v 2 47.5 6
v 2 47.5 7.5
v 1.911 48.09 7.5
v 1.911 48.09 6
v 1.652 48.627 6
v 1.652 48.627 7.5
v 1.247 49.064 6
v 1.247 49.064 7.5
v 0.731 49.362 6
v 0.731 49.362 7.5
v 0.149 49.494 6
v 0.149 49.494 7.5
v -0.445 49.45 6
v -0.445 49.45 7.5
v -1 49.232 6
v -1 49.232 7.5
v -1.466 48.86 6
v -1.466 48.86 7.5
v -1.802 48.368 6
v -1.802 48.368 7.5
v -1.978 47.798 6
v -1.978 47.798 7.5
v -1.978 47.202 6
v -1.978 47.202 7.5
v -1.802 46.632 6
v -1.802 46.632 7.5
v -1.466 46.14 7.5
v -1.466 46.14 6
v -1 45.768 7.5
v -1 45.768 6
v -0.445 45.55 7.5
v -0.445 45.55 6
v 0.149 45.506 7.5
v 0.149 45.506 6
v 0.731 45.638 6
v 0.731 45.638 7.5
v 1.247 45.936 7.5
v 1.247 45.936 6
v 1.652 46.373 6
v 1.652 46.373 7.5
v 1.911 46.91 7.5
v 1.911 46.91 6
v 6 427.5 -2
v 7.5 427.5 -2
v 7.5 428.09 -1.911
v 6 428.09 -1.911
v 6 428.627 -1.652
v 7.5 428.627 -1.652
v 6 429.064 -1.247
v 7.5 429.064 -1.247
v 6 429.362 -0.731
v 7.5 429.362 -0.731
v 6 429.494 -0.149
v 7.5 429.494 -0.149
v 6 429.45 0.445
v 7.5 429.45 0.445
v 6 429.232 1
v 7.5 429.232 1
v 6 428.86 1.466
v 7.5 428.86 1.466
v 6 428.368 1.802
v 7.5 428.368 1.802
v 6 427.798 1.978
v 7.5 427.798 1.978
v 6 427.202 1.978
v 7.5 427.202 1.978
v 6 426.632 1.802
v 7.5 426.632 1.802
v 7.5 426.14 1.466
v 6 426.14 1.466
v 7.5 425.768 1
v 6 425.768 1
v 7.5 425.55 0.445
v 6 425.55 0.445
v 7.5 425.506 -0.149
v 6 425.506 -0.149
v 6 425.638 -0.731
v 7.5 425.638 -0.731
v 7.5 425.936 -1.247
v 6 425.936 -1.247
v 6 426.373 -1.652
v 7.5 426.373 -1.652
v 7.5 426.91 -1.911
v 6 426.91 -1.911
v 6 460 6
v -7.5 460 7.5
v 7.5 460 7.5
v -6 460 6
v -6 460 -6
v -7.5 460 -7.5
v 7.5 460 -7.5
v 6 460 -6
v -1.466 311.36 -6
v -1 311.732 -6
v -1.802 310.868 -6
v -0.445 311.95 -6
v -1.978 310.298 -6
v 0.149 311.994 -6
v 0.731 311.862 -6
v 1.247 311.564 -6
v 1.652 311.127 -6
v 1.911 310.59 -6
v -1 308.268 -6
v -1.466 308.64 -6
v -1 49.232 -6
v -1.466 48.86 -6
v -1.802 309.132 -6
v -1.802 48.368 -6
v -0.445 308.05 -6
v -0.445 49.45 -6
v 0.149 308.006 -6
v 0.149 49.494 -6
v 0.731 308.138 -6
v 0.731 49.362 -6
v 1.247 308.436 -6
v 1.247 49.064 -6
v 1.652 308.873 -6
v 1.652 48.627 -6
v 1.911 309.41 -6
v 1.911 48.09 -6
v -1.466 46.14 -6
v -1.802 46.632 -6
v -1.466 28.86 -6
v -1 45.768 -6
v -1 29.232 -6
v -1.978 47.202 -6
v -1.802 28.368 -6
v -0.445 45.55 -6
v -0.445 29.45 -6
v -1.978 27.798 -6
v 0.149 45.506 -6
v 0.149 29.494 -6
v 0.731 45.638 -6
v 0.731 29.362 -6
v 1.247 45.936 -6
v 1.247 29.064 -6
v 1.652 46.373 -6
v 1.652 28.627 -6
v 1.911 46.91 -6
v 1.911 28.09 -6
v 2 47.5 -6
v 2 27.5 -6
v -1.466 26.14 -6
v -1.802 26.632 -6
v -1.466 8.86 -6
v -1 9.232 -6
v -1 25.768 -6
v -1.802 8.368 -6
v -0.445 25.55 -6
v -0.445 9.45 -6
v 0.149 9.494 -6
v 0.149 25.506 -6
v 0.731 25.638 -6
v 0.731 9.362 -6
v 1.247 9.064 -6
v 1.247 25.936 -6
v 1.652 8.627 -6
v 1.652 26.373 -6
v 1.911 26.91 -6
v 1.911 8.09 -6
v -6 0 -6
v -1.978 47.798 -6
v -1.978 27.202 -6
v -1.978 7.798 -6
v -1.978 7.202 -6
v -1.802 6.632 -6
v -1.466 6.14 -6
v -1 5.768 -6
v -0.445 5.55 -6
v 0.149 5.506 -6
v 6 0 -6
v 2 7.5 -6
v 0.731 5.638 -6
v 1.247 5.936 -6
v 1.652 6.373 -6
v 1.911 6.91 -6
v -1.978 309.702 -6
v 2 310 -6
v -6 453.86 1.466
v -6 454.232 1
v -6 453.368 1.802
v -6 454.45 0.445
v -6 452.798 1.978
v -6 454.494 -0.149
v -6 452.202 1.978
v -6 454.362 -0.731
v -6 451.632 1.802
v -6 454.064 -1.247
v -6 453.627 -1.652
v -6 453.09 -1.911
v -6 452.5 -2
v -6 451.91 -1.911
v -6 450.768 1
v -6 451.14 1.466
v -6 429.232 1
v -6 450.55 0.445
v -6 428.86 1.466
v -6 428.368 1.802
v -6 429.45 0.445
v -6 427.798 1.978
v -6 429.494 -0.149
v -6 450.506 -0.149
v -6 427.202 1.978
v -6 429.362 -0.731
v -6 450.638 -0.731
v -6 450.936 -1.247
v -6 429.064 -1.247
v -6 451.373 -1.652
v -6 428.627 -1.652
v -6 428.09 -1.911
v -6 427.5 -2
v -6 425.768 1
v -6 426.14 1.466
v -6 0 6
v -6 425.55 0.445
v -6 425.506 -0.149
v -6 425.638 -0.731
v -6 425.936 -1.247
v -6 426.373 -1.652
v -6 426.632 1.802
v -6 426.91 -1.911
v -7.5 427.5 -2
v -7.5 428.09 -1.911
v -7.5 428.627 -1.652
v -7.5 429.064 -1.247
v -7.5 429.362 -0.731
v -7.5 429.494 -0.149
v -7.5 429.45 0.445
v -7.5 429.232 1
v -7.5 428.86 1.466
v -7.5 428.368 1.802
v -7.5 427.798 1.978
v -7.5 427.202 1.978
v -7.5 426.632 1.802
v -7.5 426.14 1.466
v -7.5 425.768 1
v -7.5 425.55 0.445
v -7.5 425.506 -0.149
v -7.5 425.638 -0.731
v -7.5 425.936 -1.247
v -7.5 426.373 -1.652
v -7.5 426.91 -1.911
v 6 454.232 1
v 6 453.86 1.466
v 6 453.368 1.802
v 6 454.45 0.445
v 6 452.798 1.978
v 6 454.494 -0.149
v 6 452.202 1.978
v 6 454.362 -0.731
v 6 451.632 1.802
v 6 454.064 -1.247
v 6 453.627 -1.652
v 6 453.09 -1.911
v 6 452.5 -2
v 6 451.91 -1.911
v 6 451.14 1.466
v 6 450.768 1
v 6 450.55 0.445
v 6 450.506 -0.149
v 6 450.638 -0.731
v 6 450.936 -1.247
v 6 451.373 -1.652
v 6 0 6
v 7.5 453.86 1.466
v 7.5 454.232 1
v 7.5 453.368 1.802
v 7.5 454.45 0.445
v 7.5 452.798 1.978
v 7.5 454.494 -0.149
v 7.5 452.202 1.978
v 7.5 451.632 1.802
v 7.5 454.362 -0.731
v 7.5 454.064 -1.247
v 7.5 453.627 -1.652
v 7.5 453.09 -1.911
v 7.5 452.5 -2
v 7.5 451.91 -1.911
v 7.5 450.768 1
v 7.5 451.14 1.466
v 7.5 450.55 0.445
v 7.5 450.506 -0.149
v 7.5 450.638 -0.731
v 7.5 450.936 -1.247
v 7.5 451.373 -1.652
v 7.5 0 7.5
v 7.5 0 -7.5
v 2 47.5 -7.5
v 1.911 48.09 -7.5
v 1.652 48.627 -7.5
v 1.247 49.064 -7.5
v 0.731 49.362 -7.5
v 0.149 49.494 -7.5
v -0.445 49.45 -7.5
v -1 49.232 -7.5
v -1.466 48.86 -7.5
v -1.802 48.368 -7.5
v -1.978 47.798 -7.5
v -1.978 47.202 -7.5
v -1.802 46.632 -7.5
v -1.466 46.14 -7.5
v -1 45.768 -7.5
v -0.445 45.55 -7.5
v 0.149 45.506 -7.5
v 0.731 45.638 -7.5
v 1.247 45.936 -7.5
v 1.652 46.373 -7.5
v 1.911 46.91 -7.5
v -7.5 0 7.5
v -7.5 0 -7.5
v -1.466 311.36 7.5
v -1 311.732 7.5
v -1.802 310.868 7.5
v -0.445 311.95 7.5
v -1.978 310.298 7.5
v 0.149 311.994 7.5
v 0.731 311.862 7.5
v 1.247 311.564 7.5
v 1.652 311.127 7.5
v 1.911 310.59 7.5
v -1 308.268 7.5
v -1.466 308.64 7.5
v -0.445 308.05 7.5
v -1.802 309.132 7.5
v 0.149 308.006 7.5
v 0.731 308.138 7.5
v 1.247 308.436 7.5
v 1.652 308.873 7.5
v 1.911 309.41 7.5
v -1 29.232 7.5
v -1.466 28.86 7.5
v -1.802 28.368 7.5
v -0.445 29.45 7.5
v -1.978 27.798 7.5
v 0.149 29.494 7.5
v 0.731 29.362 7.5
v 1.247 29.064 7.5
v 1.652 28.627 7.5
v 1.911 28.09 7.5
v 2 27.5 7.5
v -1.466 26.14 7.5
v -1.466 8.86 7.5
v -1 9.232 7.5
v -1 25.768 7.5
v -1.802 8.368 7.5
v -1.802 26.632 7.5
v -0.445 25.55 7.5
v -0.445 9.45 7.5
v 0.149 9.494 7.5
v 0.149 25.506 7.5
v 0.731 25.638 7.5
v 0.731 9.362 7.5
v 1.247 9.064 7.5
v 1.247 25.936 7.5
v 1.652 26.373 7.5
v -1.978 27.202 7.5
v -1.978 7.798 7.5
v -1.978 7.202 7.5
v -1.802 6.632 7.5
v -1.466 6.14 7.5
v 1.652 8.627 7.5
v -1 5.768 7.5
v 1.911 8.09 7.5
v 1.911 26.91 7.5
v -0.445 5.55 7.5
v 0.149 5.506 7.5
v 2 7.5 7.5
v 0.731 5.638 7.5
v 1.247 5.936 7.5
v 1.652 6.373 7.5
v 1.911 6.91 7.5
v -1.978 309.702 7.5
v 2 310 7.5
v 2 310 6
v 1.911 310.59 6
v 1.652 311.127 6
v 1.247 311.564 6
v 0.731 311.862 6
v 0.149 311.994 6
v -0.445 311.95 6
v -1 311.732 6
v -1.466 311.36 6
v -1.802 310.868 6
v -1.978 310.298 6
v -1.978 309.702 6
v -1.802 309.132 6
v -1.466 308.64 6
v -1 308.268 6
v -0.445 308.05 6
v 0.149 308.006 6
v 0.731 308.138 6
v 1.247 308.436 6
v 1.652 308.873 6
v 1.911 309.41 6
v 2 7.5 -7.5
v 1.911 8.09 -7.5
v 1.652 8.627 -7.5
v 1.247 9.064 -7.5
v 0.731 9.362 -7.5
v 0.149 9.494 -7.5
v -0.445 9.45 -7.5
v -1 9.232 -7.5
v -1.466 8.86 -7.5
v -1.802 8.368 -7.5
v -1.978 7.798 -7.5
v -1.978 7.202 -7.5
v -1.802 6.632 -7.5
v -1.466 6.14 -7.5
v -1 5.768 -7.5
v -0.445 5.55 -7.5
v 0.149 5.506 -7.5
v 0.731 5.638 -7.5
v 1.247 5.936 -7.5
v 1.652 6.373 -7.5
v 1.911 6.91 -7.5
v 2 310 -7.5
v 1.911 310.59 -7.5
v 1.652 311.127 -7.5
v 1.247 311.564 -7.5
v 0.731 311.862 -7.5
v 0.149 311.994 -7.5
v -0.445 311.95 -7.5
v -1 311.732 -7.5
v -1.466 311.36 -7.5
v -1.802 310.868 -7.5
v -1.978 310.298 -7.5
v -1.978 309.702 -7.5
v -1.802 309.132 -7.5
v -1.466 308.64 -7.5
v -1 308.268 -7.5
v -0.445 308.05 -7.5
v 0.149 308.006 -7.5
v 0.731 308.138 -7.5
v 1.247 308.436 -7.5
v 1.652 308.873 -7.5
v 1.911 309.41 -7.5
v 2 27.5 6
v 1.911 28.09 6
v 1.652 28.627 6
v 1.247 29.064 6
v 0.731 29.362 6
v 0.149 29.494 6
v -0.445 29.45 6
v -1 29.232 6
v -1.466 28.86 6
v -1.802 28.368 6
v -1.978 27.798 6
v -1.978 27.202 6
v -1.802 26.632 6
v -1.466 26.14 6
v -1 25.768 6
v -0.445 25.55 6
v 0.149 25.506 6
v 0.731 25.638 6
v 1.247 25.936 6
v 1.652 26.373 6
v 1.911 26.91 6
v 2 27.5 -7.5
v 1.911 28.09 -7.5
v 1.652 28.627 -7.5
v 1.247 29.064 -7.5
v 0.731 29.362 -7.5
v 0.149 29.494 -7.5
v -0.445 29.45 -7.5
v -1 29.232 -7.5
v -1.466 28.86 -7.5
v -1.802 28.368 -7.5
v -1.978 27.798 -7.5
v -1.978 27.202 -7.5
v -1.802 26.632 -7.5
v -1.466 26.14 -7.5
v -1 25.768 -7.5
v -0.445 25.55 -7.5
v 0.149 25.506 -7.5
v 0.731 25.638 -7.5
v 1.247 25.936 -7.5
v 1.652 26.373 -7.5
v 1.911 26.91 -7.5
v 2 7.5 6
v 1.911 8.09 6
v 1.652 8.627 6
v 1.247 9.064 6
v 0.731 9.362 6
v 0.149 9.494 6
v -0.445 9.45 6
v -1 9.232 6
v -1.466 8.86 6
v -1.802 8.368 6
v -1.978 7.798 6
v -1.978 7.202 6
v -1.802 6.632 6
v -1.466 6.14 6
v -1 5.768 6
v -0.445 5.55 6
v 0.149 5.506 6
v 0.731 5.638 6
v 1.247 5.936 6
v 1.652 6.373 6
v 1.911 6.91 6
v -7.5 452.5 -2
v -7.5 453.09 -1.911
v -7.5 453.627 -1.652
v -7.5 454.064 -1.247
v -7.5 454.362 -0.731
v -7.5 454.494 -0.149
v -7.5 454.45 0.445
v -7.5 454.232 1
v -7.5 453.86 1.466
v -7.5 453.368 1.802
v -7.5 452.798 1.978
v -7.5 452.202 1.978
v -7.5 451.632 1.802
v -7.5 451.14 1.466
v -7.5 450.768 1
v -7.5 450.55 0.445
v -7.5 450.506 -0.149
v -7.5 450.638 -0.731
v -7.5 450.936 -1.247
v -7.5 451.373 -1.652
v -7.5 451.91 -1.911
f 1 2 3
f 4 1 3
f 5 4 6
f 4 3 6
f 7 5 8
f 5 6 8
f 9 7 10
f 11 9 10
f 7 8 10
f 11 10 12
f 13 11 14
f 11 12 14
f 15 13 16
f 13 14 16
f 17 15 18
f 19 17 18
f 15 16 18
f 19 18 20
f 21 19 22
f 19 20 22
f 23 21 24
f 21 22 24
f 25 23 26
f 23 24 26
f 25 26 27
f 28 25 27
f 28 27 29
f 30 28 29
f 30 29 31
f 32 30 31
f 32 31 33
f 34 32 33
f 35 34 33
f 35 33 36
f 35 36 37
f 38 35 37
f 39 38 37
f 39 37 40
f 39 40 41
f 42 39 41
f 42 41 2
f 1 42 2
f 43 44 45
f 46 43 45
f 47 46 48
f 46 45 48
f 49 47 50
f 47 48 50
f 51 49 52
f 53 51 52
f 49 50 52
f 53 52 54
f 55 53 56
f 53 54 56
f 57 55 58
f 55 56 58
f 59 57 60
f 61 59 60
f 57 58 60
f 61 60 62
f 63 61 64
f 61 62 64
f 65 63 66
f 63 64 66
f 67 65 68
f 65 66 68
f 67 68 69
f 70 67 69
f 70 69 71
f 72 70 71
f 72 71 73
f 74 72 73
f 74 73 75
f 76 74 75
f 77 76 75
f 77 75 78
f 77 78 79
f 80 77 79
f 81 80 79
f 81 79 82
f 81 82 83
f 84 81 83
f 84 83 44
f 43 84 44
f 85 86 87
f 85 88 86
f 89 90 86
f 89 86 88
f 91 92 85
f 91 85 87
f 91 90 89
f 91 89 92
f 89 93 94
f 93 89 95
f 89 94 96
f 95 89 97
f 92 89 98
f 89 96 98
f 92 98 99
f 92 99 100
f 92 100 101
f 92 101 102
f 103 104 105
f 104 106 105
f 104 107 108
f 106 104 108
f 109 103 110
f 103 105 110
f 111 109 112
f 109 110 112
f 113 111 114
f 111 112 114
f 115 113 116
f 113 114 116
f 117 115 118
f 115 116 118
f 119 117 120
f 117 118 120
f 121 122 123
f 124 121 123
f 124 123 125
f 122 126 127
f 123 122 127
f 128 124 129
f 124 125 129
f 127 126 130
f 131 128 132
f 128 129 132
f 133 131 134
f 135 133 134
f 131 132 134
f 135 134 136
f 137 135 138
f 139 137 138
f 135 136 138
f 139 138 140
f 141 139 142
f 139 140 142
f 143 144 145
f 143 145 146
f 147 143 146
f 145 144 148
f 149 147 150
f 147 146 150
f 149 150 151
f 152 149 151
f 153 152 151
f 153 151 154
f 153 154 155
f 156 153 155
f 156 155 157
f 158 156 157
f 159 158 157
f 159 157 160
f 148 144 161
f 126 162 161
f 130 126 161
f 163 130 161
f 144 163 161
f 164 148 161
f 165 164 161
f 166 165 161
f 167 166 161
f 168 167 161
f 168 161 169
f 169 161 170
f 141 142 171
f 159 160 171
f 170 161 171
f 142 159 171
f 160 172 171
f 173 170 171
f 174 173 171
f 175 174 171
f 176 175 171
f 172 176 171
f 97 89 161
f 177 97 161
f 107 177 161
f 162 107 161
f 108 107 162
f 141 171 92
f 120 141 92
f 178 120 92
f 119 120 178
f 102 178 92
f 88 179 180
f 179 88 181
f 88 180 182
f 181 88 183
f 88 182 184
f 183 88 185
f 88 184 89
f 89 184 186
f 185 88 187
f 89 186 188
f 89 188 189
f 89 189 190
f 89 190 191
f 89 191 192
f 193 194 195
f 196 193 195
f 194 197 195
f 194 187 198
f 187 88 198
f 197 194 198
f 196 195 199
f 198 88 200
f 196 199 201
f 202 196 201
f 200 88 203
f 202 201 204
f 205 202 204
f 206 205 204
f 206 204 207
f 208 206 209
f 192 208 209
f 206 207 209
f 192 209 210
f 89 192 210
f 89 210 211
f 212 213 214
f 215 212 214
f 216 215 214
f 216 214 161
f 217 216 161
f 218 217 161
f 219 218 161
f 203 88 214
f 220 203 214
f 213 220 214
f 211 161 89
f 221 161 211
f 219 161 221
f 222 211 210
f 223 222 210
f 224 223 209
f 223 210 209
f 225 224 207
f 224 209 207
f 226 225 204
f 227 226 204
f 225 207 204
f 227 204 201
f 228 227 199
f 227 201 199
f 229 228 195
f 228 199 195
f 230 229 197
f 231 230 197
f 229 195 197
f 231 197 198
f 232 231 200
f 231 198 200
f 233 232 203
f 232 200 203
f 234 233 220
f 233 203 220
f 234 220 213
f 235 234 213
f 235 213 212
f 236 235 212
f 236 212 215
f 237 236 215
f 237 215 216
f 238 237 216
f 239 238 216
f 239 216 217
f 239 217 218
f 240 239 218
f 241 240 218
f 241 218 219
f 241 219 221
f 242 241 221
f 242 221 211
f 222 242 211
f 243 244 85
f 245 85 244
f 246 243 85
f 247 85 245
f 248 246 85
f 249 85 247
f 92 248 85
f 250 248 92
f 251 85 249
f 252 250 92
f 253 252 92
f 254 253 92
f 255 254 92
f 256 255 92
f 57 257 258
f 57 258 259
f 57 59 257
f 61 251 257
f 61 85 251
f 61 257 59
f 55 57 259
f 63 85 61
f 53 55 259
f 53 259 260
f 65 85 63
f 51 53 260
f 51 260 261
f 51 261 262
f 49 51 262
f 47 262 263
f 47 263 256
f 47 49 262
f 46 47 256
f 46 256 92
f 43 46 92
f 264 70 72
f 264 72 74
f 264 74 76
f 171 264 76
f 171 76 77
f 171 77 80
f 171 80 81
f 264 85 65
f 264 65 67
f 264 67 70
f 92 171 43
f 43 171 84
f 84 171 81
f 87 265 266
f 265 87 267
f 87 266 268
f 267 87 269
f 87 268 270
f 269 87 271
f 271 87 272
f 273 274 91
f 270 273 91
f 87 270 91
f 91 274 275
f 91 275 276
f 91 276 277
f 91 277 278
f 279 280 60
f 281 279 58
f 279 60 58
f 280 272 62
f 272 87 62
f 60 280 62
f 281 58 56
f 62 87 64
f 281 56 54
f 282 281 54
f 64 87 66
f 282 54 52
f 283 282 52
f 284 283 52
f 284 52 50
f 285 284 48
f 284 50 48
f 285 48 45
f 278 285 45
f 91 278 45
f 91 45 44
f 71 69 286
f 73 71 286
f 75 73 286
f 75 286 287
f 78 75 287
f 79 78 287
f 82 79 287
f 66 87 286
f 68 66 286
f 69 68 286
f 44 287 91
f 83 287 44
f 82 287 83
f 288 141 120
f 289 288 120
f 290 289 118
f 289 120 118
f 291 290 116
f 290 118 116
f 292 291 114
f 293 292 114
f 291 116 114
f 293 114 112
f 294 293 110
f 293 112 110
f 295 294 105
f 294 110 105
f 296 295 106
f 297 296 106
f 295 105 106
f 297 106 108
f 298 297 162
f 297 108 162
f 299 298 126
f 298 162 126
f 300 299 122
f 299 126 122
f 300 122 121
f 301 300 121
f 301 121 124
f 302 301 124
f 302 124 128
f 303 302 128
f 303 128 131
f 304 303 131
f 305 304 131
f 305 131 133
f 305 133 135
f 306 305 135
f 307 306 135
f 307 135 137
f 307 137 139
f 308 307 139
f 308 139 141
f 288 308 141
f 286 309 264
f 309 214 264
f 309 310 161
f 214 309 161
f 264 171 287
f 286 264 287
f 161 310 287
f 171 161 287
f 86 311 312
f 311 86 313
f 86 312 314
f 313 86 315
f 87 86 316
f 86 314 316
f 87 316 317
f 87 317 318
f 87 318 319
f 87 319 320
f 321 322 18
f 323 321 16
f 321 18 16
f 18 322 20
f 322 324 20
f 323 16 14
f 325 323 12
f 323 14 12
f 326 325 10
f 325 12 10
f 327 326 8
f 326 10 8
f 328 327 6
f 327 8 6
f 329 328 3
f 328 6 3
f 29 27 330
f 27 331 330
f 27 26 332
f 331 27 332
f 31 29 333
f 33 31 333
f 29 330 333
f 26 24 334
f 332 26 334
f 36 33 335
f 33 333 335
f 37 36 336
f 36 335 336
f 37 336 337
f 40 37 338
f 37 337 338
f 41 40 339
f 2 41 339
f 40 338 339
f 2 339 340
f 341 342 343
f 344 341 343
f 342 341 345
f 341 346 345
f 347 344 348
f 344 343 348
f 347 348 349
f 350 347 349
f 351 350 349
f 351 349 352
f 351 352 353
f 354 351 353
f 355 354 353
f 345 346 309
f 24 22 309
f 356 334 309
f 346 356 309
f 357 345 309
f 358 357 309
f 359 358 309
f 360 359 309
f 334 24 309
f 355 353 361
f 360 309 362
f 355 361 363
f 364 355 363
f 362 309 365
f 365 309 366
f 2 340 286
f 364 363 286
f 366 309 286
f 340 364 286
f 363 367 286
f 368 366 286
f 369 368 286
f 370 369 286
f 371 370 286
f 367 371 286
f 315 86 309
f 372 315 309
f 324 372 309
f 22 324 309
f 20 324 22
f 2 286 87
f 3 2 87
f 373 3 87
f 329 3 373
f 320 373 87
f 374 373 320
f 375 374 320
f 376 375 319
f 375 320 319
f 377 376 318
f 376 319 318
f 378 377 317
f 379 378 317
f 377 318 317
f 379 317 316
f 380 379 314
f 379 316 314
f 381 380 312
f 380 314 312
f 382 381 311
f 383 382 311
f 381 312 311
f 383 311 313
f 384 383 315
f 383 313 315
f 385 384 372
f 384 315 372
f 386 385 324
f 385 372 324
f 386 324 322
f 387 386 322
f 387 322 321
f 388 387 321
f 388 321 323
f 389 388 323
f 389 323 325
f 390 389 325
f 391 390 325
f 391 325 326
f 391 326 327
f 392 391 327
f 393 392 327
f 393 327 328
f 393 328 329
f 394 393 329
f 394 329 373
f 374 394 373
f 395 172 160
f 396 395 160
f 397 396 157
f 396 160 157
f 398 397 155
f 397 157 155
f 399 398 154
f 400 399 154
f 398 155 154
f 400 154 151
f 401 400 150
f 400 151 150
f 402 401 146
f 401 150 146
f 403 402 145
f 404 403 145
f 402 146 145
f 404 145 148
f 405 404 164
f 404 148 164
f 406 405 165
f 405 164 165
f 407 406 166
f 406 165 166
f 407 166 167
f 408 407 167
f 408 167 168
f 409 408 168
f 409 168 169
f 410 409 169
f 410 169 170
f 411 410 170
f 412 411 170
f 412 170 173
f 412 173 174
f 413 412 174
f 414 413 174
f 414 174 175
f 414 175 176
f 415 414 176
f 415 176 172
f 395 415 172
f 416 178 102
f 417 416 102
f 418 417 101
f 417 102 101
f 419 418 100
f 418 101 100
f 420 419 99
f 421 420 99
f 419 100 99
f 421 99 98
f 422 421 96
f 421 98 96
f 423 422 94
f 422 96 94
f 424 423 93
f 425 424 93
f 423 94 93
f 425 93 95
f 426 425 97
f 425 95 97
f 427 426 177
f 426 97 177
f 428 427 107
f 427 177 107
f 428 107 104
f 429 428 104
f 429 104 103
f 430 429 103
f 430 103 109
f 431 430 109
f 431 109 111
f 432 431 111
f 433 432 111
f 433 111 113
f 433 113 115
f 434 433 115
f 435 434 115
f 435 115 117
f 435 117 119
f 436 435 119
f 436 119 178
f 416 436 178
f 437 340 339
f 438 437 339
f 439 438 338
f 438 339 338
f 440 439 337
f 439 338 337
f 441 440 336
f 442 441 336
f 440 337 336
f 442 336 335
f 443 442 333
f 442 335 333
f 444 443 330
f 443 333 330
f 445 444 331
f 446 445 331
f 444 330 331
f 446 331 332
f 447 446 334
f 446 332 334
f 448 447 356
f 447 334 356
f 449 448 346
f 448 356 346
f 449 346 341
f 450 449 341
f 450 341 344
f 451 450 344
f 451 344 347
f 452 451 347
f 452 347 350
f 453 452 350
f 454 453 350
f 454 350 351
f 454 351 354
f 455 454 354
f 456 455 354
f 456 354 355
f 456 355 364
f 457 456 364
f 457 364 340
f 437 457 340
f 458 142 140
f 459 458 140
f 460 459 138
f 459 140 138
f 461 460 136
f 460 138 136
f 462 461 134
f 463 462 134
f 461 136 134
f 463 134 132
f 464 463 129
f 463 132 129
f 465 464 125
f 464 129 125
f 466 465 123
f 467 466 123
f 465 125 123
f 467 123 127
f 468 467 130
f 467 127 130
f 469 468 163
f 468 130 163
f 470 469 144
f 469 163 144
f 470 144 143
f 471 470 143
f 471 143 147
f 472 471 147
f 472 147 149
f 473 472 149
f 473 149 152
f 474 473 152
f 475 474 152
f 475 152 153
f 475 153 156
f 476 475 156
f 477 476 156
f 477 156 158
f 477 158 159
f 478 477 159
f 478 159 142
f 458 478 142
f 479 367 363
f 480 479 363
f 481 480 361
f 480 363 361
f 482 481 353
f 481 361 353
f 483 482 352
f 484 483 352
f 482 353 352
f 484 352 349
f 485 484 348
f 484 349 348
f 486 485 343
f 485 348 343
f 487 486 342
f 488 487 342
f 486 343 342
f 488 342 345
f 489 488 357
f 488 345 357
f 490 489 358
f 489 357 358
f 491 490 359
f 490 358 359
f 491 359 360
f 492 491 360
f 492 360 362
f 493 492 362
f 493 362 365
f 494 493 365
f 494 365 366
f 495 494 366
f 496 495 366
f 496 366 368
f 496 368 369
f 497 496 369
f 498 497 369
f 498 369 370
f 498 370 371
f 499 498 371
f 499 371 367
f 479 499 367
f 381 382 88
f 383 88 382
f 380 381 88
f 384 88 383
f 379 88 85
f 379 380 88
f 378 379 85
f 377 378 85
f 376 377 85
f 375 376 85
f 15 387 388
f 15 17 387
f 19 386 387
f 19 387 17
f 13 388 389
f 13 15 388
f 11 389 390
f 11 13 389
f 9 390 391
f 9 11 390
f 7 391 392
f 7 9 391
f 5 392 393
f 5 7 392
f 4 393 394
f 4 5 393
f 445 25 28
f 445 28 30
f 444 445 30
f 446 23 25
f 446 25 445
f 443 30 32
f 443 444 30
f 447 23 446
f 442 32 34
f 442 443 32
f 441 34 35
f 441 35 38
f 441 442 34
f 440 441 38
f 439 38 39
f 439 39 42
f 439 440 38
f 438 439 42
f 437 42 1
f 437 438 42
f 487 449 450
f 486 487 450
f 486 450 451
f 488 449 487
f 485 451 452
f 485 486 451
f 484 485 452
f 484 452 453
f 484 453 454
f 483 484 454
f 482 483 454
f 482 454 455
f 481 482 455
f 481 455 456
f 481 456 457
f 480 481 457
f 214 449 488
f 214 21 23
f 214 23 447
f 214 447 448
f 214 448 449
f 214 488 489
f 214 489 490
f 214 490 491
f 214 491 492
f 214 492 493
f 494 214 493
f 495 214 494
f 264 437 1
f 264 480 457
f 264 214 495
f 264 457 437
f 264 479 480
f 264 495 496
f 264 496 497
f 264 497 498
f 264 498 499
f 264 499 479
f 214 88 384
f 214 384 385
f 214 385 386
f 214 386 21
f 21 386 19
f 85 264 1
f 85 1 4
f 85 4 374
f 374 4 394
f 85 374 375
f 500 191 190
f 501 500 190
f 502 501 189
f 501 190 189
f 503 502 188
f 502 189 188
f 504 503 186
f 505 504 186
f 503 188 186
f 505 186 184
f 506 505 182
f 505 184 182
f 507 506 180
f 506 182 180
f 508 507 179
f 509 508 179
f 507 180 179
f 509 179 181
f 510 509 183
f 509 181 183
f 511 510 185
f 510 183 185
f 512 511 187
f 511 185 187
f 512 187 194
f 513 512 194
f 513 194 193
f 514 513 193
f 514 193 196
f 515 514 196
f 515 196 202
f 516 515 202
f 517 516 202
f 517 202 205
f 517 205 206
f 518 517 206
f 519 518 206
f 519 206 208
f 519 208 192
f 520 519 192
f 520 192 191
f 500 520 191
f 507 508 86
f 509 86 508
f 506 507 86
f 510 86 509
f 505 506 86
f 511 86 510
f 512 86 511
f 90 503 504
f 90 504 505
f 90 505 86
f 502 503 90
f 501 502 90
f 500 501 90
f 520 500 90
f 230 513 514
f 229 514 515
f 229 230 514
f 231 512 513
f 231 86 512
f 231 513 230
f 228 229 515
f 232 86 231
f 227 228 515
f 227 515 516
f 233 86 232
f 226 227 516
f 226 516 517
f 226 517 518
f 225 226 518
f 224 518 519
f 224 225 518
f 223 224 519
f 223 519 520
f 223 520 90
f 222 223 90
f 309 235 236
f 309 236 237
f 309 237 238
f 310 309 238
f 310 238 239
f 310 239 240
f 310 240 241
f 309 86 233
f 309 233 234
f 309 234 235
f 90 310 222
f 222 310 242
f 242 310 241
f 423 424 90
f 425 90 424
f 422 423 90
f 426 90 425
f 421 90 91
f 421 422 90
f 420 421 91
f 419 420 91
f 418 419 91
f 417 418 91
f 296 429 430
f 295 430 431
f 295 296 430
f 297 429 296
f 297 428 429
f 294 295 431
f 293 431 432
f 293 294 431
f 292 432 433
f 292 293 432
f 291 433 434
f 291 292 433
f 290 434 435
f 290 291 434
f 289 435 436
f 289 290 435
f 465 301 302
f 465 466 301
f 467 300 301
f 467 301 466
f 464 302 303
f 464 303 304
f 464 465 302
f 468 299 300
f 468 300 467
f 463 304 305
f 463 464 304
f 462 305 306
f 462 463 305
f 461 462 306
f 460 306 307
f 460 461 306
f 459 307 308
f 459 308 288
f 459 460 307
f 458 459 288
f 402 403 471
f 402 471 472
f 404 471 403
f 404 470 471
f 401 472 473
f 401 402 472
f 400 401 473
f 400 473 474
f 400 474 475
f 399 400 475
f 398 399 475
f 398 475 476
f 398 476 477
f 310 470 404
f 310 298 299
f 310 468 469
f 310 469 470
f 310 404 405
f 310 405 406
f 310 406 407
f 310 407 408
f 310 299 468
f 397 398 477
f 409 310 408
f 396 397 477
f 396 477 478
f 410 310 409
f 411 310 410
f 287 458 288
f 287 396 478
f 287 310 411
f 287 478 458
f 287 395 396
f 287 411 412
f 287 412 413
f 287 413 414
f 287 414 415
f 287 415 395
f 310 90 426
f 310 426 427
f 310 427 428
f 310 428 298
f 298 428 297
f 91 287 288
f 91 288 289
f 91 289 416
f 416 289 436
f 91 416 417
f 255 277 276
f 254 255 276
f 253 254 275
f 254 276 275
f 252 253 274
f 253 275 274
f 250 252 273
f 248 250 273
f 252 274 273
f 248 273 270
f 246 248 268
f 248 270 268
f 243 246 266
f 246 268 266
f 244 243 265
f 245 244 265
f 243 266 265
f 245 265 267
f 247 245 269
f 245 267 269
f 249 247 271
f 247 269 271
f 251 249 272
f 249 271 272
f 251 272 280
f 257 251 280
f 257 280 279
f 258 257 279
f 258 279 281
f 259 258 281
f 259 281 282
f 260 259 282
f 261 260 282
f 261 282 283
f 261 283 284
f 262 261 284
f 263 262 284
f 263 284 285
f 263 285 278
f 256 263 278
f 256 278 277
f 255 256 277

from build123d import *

# Parameters (mm, degrees)
SKETCH_1_W          = 15
SKETCH_1_H          = 15
SKETCH_1_W_2        = 12
SKETCH_1_H_2        = 12
EXTRUDE_1_DEPTH     = 460
SKETCH_2_R          = 2
CUT_EXTRUDE_1_DEPTH = 461.305605006
SKETCH_3_R          = 2
CUT_EXTRUDE_2_DEPTH = 461.305605006


with BuildPart() as part:
    # ｽｹｯﾁ1 → 押し出し-薄板1 (new body)
    with BuildSketch(Plane(origin=(0, 0, 0), x_dir=(1, 0, 0), z_dir=(0, 1, 0))):
        Rectangle(SKETCH_1_W, SKETCH_1_H)
        Rectangle(SKETCH_1_W_2, SKETCH_1_H_2, mode=Mode.SUBTRACT)
    extrude(amount=EXTRUDE_1_DEPTH)

    # ｽｹｯﾁ2 → ｶｯﾄ - 押し出し1 (cut, through all)
    with BuildSketch(Plane(origin=(7.5, 0, 0), x_dir=(0, 0, -1), z_dir=(1, 0, 0))):
        with Locations((0, 452.5)):
            Circle(SKETCH_2_R)
        with Locations((0, 427.5)):
            Circle(SKETCH_2_R)
    extrude(amount=-CUT_EXTRUDE_1_DEPTH, mode=Mode.SUBTRACT)

    # ｽｹｯﾁ3 → ｶｯﾄ - 押し出し2 (cut, through all)
    with BuildSketch(Plane.XY.offset(7.5)):
        with Locations((0, 7.5)):
            Circle(SKETCH_3_R)
        with Locations((0, 47.5)):
            Circle(SKETCH_3_R)
        with Locations((0, 27.5)):
            Circle(SKETCH_3_R)
        with Locations((0, 310)):
            Circle(SKETCH_3_R)
    extrude(amount=-CUT_EXTRUDE_2_DEPTH, mode=Mode.SUBTRACT)


solid = part.part
